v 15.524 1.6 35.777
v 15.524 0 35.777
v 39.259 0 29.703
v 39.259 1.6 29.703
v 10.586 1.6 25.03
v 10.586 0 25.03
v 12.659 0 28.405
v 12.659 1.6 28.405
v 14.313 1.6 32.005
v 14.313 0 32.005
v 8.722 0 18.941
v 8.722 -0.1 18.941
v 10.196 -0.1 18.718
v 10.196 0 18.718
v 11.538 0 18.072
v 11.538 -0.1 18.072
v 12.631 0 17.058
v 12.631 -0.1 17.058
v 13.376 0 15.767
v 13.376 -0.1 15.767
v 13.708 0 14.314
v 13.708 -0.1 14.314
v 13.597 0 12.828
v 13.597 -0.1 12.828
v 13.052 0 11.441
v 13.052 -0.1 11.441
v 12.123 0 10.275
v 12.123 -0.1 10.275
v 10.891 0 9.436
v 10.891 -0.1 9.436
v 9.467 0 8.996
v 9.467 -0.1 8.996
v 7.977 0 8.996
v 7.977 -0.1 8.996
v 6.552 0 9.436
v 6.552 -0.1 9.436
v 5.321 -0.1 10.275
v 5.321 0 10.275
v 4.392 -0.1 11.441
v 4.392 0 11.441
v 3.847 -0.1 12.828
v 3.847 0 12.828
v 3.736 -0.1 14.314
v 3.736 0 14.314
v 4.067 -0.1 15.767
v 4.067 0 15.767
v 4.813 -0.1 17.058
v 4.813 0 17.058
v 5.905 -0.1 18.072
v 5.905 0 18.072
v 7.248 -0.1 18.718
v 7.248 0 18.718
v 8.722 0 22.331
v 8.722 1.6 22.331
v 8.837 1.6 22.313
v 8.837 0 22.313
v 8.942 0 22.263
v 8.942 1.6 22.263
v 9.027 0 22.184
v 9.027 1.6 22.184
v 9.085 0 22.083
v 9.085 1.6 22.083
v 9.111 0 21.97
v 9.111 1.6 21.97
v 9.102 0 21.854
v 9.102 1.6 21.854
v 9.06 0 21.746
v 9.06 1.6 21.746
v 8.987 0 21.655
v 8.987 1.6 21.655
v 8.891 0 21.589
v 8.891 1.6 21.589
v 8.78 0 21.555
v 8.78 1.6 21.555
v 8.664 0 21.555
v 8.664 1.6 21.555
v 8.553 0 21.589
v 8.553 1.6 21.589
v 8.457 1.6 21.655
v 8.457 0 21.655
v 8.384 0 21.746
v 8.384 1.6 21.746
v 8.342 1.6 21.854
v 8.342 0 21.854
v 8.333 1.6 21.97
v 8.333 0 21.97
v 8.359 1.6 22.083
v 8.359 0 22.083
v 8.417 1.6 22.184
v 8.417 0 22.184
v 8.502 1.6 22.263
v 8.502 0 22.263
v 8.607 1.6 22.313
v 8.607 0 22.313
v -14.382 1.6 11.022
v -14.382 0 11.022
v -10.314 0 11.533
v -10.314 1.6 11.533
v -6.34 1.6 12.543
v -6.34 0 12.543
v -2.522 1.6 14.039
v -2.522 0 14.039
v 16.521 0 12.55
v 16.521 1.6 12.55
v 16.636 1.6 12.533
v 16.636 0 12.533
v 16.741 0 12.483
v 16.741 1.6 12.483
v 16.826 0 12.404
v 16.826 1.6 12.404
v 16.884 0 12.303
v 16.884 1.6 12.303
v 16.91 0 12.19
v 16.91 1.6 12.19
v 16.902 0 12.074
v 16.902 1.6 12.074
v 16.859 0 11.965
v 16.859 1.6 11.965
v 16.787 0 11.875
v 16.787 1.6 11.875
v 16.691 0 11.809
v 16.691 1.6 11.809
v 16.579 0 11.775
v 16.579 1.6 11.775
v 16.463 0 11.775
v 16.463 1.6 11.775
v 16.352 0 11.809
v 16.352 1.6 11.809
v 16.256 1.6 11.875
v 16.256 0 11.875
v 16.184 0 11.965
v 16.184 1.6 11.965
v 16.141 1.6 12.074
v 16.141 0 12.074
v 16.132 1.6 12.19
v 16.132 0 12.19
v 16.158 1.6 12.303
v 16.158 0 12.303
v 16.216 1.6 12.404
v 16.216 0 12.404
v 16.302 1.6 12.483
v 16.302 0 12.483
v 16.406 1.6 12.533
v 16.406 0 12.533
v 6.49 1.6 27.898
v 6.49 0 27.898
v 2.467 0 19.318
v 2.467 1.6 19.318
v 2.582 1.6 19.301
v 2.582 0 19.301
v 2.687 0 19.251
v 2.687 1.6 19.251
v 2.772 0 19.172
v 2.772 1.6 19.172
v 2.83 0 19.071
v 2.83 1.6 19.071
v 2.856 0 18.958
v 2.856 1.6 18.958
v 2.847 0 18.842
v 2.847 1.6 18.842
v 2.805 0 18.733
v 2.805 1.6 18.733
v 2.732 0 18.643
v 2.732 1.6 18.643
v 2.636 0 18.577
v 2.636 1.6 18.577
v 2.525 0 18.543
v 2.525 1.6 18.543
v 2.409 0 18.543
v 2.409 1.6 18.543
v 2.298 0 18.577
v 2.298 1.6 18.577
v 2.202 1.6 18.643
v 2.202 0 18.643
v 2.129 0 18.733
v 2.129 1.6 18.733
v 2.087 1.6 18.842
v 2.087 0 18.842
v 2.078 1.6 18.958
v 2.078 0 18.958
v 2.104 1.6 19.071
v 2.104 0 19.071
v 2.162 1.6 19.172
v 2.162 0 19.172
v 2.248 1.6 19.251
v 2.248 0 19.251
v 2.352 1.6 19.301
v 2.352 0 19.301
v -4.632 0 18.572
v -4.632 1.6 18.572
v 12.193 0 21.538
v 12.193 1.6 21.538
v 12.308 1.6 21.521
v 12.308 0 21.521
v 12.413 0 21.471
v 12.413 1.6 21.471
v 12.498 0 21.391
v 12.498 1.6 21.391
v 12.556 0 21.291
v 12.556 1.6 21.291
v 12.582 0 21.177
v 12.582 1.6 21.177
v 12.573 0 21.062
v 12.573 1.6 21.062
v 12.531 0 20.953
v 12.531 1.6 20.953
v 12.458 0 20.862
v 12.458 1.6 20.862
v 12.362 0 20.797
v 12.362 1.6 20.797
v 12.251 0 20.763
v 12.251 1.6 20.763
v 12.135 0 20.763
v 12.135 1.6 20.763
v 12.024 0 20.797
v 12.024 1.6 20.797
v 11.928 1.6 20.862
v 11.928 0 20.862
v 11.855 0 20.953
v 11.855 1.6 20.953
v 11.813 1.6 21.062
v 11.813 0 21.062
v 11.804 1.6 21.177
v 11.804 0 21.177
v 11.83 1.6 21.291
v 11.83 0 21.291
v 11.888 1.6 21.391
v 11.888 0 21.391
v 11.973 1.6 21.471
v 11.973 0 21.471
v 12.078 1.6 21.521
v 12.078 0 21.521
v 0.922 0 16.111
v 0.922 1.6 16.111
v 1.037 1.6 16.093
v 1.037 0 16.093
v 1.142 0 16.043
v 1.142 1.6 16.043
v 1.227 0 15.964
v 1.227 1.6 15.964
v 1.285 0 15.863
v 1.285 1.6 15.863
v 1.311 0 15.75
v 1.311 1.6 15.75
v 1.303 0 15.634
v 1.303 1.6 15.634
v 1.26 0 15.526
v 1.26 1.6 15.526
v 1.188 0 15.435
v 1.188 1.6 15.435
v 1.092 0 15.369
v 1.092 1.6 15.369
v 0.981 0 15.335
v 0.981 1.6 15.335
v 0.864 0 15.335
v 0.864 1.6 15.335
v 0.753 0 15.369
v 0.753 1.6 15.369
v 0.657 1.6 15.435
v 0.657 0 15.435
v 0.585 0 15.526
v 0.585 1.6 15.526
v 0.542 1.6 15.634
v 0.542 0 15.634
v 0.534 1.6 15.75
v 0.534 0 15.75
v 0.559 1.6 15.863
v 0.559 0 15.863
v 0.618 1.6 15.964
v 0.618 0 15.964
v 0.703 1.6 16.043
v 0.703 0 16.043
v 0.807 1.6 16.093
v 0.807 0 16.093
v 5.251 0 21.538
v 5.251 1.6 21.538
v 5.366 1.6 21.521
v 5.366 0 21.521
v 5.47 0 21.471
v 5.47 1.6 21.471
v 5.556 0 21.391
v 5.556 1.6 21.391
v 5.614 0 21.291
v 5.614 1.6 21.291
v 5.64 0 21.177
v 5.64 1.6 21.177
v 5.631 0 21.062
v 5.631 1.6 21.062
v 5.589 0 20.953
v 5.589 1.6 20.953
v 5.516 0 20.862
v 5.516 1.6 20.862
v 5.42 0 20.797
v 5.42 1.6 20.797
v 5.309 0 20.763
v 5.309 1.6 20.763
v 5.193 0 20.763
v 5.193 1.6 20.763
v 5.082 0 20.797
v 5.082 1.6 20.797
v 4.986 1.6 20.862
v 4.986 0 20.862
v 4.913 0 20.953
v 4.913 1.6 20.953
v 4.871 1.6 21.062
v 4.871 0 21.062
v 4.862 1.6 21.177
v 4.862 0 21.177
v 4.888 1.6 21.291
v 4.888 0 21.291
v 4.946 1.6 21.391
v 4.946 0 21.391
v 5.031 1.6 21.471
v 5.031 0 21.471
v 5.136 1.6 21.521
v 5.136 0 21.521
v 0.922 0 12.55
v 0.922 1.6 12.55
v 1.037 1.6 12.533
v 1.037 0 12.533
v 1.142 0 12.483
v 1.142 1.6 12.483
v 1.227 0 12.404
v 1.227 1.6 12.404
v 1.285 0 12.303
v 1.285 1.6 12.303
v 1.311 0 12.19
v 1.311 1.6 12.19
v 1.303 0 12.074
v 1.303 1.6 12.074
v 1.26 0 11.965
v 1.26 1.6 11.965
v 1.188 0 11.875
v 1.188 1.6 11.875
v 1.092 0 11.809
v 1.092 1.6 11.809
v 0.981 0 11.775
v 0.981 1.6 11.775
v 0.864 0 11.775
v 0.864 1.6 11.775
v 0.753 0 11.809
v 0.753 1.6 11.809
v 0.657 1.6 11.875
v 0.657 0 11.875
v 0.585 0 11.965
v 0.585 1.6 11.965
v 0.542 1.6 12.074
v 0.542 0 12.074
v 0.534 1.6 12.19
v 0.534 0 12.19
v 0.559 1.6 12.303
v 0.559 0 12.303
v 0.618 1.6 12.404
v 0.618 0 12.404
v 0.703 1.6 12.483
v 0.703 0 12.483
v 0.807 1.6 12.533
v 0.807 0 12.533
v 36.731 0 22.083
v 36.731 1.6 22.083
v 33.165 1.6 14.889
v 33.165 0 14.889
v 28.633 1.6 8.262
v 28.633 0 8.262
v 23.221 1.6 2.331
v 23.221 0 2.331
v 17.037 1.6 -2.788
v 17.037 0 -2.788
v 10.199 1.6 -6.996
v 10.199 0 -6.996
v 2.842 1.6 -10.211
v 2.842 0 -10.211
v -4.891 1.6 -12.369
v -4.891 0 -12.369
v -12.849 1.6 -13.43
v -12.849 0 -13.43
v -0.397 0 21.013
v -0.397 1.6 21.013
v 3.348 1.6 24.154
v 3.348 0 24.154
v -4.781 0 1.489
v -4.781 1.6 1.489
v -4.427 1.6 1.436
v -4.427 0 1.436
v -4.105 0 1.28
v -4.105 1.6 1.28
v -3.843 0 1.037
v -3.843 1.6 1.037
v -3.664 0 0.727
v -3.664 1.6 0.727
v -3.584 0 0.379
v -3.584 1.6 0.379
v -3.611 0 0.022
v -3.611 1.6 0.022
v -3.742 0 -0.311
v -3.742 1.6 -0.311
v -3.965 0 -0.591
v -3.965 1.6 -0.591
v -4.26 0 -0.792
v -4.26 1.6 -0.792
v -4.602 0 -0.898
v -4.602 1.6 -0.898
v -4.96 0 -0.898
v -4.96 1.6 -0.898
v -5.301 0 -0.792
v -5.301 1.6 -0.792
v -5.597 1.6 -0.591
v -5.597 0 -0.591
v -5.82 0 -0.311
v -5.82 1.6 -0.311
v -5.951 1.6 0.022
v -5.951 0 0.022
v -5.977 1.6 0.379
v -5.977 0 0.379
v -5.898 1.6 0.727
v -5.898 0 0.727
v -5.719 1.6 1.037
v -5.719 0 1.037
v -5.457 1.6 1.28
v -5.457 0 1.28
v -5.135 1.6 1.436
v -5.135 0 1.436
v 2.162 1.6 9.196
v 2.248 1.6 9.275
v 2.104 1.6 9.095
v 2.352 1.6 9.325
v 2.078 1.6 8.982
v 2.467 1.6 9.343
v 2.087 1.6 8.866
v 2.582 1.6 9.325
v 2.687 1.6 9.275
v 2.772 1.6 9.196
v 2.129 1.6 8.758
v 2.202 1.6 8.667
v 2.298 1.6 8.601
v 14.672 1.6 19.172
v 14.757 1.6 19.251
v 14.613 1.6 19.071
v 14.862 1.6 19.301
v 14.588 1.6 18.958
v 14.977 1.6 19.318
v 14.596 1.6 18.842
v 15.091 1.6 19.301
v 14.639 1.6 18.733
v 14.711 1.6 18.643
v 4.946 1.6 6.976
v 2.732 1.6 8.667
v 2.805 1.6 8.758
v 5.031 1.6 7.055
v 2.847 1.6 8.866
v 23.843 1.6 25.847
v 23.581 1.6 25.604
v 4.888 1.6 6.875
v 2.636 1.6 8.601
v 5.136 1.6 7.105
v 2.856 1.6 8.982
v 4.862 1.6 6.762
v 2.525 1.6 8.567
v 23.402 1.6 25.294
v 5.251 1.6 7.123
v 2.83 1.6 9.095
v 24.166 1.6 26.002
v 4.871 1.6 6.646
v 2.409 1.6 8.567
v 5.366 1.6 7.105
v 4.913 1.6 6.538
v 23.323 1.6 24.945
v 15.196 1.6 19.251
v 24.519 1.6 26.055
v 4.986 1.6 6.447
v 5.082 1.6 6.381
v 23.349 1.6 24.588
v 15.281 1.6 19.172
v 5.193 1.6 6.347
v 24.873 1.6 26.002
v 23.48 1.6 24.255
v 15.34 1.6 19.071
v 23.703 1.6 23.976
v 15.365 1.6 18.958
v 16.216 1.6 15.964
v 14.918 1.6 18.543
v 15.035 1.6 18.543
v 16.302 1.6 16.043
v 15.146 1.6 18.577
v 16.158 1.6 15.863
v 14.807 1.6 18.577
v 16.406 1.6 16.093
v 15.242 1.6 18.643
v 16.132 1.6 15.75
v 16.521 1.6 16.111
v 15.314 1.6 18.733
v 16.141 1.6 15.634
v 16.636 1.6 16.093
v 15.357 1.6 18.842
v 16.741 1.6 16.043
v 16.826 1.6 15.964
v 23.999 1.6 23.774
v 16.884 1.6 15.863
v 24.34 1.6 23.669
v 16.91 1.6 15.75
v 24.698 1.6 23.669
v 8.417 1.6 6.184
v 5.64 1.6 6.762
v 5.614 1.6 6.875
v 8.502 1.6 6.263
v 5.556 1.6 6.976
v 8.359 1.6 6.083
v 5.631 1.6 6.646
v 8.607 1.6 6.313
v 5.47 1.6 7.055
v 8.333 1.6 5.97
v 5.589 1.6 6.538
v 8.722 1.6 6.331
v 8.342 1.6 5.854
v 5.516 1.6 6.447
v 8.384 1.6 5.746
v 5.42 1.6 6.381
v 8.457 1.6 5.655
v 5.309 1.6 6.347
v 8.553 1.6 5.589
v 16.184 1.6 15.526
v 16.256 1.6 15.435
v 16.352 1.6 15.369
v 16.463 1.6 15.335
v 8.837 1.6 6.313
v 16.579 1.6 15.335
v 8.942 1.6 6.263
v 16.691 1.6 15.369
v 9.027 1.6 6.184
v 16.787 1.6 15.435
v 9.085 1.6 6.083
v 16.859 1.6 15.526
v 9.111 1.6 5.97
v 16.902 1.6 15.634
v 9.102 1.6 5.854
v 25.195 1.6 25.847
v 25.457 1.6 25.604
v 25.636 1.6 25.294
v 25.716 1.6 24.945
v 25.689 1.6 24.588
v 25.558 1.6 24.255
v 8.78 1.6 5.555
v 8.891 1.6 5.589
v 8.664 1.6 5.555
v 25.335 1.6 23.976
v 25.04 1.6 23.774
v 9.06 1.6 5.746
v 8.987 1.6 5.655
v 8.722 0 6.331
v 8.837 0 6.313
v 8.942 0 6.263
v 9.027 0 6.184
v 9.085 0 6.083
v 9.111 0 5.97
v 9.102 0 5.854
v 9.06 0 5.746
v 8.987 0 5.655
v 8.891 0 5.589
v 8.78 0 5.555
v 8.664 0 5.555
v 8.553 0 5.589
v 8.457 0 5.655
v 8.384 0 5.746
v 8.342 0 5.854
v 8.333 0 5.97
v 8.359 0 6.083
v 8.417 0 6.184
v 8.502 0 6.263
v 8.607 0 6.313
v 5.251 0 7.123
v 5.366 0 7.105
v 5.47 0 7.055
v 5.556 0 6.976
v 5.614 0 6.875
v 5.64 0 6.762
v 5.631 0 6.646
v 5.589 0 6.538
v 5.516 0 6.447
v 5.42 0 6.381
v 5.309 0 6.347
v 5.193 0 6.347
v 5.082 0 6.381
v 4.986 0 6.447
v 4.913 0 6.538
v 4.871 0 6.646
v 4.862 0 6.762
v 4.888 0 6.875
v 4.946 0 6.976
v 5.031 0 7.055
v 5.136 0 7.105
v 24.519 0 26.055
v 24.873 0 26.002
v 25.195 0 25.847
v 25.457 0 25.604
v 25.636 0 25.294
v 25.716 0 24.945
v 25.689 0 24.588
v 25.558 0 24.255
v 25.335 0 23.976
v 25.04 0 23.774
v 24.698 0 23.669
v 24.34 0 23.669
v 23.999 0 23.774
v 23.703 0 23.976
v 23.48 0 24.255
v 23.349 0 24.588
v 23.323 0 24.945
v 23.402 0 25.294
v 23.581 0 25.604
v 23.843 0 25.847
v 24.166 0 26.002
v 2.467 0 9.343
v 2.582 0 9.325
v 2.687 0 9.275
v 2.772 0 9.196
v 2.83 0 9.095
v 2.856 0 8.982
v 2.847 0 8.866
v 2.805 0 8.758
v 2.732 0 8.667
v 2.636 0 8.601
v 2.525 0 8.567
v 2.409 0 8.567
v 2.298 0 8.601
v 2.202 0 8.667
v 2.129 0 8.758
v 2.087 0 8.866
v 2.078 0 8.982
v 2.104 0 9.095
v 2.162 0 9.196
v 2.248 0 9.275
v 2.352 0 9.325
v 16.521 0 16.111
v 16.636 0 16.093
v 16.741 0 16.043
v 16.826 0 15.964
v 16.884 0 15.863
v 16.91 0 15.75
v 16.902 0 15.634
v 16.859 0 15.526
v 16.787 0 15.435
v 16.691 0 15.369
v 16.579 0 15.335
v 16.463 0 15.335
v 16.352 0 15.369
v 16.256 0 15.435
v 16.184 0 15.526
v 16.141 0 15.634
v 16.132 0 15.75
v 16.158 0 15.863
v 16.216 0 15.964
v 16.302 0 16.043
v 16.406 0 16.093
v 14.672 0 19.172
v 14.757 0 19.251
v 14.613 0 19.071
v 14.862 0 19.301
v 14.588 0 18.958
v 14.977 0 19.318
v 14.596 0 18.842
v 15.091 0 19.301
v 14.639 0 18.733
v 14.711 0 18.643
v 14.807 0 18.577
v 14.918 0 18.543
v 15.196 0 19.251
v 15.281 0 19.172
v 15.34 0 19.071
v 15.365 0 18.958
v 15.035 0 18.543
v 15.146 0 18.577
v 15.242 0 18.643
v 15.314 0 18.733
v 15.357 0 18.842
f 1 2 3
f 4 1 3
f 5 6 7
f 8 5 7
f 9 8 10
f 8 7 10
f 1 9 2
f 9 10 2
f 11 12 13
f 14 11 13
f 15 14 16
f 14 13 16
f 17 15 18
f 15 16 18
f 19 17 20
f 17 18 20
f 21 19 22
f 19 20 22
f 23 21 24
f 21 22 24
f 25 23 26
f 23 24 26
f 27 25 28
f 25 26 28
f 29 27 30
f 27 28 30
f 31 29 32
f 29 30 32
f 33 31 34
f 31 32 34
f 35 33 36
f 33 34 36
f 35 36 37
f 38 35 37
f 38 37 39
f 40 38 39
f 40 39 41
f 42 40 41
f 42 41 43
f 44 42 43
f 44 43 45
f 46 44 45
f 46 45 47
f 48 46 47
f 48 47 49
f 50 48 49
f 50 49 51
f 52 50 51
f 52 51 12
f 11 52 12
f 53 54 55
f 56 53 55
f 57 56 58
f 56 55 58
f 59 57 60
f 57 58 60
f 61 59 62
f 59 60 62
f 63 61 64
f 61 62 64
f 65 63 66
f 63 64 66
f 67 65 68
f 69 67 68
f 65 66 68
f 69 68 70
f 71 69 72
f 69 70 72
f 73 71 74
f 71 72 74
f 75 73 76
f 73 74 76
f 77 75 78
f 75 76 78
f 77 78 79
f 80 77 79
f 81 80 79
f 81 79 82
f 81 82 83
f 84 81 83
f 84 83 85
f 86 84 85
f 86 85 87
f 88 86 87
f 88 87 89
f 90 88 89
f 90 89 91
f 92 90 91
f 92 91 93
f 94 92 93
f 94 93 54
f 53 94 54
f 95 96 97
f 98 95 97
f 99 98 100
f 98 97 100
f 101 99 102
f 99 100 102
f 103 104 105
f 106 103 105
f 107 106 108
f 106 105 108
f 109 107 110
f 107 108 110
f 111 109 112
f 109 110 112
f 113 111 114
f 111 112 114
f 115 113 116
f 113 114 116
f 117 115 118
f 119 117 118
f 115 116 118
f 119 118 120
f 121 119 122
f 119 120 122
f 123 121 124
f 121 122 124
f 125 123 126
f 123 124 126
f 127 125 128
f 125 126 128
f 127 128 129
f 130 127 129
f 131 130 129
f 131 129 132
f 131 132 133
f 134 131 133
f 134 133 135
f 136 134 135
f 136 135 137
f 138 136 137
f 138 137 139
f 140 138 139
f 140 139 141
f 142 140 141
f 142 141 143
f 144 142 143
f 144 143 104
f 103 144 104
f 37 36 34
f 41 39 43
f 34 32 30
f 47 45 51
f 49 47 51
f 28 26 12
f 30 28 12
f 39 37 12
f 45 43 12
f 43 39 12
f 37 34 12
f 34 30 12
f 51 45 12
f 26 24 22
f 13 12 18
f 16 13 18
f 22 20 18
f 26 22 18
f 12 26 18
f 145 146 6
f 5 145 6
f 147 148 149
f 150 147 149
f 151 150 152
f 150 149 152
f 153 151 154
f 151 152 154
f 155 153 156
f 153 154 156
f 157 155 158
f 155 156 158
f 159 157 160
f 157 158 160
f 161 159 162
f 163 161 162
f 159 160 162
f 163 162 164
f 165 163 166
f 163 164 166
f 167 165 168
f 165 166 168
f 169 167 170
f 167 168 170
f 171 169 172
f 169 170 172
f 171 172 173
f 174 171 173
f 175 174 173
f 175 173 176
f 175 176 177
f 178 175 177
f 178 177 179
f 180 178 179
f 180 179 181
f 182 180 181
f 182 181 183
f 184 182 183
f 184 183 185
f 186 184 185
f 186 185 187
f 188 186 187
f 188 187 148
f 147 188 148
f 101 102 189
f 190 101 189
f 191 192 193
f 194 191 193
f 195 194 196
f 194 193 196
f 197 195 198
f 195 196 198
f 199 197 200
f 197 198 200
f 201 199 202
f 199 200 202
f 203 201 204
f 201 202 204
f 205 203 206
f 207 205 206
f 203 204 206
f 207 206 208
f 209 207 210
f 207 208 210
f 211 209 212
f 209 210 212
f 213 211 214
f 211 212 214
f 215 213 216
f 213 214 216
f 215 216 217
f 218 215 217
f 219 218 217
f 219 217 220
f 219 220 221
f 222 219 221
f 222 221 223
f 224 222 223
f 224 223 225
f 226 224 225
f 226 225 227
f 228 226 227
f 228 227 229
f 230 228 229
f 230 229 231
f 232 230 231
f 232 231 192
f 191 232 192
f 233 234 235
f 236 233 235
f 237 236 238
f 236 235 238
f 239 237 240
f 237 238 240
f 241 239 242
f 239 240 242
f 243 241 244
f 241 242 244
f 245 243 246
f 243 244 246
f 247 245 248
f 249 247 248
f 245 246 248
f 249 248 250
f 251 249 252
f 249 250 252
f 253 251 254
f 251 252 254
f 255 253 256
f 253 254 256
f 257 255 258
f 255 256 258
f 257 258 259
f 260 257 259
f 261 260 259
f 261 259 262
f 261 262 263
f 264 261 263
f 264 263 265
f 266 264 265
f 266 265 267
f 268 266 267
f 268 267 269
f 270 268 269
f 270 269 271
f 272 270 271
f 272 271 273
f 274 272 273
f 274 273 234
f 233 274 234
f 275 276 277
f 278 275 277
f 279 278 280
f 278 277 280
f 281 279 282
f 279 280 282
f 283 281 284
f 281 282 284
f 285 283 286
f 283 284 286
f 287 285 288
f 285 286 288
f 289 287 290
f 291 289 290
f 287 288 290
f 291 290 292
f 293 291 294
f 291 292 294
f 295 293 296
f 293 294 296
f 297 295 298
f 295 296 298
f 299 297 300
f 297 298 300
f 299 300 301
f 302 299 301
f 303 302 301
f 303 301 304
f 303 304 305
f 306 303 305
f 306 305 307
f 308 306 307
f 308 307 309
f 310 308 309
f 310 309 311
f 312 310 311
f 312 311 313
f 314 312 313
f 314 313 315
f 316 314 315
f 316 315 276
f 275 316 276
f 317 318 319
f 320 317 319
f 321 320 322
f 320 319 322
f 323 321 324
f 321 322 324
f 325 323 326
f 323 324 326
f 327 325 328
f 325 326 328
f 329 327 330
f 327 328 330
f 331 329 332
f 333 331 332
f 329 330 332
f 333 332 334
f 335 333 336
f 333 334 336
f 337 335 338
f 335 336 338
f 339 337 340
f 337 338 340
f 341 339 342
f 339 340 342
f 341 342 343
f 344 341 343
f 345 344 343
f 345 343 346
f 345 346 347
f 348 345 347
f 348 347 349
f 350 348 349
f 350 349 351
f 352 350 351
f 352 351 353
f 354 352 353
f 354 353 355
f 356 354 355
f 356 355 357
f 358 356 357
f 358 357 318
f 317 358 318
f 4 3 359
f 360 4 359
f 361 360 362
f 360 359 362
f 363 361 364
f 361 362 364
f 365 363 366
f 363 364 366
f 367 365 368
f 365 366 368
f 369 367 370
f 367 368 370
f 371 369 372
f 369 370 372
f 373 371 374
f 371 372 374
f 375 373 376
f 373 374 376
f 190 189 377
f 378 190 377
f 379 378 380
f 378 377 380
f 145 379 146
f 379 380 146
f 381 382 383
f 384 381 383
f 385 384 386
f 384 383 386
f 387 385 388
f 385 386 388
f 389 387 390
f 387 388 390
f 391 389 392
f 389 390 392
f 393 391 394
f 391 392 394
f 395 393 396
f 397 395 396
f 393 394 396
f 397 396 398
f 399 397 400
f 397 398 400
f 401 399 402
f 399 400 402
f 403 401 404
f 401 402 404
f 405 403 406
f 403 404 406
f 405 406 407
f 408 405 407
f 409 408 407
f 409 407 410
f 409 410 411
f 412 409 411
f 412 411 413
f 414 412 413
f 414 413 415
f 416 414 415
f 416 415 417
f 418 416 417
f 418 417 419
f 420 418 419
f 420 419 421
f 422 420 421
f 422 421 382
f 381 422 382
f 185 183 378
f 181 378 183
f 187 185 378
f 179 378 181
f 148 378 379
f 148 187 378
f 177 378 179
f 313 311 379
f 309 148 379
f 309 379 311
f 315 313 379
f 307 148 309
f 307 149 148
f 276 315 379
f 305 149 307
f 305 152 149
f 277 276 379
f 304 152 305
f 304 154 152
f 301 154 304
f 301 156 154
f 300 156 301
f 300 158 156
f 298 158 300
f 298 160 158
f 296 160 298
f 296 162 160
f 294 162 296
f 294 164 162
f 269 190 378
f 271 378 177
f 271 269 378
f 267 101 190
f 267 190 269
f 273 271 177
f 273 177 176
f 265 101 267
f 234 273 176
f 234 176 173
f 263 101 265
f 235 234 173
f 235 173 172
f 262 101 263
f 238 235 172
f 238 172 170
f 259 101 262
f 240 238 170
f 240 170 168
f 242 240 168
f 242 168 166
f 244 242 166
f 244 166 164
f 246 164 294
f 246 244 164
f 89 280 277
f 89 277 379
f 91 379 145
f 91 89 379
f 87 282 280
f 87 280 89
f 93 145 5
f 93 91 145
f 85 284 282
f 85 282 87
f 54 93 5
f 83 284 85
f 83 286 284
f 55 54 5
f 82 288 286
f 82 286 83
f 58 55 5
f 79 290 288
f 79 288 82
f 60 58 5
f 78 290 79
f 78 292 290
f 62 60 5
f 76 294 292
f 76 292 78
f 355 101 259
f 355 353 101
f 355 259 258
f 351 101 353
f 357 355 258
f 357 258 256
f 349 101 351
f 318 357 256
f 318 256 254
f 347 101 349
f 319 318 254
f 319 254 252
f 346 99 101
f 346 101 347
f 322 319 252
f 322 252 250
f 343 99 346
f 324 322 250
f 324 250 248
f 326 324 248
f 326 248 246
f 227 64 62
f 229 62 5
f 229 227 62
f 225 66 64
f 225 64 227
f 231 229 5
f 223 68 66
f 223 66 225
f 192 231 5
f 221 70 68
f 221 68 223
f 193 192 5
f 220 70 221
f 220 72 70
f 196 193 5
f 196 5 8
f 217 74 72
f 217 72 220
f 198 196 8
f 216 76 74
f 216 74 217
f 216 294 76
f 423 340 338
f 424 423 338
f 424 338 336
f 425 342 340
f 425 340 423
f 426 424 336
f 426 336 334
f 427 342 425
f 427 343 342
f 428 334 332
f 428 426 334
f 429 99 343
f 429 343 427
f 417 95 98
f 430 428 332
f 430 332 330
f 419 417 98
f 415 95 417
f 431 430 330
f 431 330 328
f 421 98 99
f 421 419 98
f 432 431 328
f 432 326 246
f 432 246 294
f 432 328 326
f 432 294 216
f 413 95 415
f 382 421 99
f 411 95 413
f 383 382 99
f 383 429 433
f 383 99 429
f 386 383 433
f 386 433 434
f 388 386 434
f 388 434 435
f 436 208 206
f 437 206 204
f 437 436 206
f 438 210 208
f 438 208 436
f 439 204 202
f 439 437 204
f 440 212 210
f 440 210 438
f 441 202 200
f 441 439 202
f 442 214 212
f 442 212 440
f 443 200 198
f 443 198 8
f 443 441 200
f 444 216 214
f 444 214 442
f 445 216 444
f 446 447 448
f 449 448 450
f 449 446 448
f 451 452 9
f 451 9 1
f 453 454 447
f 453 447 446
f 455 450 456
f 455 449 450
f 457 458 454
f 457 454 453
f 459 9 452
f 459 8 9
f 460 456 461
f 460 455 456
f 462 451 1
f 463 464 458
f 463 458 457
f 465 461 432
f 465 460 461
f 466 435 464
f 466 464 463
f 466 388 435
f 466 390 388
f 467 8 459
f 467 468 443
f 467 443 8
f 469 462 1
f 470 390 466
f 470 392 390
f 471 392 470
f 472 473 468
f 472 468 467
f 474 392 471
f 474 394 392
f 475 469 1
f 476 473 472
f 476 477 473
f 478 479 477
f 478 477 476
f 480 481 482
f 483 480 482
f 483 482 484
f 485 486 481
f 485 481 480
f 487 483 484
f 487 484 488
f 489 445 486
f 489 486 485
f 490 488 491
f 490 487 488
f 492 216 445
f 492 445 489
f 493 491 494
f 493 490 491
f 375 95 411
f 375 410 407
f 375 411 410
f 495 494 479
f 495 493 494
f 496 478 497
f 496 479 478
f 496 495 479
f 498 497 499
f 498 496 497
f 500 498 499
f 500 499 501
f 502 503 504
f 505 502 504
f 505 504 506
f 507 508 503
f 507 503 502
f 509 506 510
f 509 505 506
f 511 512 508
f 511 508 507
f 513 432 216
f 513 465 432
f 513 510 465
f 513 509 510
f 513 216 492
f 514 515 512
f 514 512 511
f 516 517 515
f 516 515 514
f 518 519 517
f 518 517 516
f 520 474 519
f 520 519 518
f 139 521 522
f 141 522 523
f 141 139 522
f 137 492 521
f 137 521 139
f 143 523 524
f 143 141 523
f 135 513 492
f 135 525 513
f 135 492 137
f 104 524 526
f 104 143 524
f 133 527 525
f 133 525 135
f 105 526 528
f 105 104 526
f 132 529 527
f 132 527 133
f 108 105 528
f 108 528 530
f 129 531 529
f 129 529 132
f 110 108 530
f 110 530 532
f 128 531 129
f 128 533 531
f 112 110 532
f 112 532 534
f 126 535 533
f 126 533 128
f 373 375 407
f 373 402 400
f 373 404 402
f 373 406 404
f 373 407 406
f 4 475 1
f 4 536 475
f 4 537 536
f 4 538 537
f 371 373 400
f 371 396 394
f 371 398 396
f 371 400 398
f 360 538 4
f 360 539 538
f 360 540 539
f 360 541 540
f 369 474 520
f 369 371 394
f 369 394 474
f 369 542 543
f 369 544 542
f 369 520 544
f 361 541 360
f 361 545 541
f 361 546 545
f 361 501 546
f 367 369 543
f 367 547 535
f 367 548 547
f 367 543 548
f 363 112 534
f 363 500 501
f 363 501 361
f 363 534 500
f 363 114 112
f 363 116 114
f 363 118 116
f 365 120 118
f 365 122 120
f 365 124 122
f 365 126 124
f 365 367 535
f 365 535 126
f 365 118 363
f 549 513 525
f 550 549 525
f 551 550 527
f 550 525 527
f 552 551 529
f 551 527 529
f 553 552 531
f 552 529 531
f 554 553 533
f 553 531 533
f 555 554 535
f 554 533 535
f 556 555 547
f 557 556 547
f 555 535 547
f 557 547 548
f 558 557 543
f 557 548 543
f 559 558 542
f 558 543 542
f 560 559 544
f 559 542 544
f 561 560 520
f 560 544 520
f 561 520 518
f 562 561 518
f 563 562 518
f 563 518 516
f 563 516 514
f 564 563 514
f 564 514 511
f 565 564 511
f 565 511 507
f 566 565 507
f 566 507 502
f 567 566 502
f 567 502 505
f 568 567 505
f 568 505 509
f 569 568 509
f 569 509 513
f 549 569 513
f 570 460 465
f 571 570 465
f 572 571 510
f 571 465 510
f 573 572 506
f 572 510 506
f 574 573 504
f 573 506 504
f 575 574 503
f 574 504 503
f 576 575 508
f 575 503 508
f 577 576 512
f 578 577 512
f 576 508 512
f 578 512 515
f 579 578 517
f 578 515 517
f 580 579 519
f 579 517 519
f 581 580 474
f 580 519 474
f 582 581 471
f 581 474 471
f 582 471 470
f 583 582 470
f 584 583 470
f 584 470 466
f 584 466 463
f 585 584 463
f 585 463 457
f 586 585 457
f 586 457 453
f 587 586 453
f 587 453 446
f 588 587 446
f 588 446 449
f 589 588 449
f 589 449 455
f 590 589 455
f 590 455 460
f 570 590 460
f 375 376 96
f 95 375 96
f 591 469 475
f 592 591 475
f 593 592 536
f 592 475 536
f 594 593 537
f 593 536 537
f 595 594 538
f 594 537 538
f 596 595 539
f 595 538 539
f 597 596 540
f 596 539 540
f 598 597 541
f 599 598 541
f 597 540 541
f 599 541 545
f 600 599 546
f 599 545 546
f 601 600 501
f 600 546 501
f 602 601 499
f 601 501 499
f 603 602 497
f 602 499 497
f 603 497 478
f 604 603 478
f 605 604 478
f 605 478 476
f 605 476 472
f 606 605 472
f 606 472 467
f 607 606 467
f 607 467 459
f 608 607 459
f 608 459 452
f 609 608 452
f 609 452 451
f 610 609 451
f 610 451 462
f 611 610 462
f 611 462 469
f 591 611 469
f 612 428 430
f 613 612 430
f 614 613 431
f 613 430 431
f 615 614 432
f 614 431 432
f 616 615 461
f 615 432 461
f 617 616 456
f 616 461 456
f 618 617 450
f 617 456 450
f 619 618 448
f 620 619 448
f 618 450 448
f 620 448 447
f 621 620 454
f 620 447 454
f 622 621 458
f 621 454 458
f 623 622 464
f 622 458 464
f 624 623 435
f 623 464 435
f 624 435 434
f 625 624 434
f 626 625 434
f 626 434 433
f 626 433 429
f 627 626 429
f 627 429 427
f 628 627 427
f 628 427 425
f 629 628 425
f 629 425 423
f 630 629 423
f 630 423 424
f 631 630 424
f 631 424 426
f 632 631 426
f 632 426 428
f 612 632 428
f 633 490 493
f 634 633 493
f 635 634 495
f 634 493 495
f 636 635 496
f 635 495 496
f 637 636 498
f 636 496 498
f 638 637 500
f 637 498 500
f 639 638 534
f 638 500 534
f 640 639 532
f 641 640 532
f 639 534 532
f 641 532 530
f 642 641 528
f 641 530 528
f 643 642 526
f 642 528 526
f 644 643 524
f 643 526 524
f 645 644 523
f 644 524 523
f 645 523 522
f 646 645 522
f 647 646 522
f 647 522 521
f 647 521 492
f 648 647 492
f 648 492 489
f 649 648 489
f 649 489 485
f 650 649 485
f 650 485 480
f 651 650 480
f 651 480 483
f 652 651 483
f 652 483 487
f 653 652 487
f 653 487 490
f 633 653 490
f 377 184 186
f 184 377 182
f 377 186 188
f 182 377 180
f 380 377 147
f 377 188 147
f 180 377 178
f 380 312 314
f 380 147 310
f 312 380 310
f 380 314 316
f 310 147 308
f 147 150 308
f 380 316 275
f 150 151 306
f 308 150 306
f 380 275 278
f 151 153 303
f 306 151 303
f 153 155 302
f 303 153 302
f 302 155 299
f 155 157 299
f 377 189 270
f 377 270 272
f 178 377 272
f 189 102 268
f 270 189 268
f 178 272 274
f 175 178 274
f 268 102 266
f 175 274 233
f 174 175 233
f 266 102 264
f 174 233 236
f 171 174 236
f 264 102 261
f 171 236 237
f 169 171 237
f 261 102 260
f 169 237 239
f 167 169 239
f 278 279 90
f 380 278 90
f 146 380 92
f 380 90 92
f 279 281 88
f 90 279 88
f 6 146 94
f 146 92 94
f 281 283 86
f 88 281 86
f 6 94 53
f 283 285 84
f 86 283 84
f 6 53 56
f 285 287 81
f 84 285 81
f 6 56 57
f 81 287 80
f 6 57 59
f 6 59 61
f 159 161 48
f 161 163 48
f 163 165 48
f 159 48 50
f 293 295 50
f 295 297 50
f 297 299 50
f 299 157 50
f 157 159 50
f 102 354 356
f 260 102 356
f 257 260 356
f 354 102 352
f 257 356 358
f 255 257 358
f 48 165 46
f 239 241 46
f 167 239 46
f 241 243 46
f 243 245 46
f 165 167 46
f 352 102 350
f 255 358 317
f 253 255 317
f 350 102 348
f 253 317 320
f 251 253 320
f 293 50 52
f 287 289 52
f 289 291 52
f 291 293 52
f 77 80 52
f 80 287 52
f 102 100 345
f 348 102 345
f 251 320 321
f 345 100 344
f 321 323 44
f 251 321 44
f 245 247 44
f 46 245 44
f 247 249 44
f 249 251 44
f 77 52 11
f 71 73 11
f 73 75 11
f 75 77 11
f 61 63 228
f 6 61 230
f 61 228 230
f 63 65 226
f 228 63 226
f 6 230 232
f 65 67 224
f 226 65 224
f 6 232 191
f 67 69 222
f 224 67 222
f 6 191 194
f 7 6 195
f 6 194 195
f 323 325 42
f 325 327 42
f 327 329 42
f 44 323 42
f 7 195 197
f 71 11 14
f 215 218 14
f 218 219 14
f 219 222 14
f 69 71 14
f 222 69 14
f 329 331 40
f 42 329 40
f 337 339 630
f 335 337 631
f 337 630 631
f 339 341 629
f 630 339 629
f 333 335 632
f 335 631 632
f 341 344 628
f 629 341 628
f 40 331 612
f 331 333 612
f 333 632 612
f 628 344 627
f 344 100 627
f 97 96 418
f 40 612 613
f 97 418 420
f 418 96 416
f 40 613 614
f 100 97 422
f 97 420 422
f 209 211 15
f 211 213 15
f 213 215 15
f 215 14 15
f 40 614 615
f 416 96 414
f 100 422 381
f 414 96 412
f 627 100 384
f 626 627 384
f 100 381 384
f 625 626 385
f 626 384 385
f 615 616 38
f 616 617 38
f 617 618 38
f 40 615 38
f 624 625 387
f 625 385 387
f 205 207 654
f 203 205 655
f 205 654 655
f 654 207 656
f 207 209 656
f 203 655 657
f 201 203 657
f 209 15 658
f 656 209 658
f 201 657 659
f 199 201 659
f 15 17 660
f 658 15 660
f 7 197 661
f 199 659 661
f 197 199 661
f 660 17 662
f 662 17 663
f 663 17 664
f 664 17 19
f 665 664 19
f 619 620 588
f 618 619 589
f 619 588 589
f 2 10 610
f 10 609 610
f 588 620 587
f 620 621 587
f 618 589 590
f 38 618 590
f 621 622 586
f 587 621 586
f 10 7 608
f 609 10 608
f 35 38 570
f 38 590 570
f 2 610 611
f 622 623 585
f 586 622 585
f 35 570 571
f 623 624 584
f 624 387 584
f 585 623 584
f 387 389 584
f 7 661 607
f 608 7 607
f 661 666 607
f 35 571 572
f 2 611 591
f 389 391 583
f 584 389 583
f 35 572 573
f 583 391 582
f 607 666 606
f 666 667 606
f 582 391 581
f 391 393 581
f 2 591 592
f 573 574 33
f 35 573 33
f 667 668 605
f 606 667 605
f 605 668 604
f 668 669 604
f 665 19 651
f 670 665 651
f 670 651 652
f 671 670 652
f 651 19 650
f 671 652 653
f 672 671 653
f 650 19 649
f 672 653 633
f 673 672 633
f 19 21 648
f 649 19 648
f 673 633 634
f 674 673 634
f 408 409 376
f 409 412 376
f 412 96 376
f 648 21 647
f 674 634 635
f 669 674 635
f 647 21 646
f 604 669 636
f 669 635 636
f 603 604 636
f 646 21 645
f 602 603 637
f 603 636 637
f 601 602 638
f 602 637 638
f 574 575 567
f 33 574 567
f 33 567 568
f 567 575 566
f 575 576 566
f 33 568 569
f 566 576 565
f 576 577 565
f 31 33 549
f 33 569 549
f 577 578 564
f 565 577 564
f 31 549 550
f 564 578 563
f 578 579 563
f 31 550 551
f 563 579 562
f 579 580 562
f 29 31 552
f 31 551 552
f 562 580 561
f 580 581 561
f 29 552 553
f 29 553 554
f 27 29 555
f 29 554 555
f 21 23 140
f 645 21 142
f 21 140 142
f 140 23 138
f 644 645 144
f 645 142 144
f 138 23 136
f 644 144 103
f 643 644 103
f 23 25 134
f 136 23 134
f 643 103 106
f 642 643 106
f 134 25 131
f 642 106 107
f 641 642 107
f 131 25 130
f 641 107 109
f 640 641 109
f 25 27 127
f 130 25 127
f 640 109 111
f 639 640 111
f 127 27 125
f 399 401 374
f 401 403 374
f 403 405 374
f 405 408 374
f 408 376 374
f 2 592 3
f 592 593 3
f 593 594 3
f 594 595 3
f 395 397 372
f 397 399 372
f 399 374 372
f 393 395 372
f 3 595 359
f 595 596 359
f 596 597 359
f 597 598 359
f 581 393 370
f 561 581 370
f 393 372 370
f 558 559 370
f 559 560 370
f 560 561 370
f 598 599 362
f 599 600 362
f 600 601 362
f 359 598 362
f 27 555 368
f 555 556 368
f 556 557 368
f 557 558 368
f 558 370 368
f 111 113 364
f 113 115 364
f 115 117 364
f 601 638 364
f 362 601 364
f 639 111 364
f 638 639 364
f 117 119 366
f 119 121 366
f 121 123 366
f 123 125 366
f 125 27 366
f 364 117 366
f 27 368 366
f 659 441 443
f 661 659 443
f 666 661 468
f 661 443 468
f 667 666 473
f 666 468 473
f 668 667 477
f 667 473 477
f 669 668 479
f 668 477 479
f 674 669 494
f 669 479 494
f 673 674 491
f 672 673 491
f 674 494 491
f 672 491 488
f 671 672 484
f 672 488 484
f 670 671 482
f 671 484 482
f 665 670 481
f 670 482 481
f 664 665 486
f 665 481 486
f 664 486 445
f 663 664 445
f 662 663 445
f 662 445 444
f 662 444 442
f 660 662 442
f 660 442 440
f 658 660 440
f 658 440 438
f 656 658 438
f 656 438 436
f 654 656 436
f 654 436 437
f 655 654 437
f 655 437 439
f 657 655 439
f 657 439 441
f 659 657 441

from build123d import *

# Parameters (mm, degrees)
SKETCH2_R           = 5
BOSS_EXTRUDE1_DEPTH = 1.6
SKETCH3_R           = 1.2
CUT_EXTRUDE1_DEPTH  = 1.7
SKETCH10_R          = 0.39
CUT_EXTRUDE6_DEPTH  = 10
BOSS_EXTRUDE3_START = -1.7
SKETCH11_R          = 5
BOSS_EXTRUDE3_DEPTH = 1.7


with BuildPart() as part:
    # Sketch2 → Boss-Extrude1 (new body)
    with BuildSketch(Plane(origin=(0, 0, 0), x_dir=(1, 0, 0), z_dir=(0, 1, 0))):
        with BuildLine():
            Line((-12.84928634, 13.429675326), (-14.381752422, -11.022350105))
            ThreePointArc((-14.381752422, -11.022350105), (-8.311058851, -11.976103518), (-2.52245469, -14.038875409))
            Line((-2.52245469, -14.038875409), (-4.632066163, -18.572035393))
            ThreePointArc((-4.632066163, -18.572035393), (1.543927211, -22.501579223), (6.490366829, -27.897591081))
            Line((6.490366829, -27.897591081), (10.586127051, -25.029708899))
            ThreePointArc((10.586127051, -25.029708899), (13.540412509, -30.180153963), (15.523932384, -35.776629267))
            Line((15.523932384, -35.776629267), (39.259103853, -29.702780788))
            ThreePointArc((39.259103853, -29.702780788), (20.218425809, 0.336488596), (-12.84928634, 13.429675326))
        make_face()
        with Locations(Location((8.721864443, -13.940574544, 0), (0, 0, 270))):
            Circle(SKETCH2_R, mode=Mode.SUBTRACT)
    extrude(amount=BOSS_EXTRUDE1_DEPTH)

    # Sketch3 → Cut-Extrude1 (cut)
    with BuildSketch(Plane(origin=(0, 1.6, 0), x_dir=(1, 0, 0), z_dir=(0, 1, 0))):
        with Locations(Location((-4.780794064, -0.288914882, 0), (0, 0, 270))):
            Circle(SKETCH3_R)
        with Locations(Location((24.519221563, -24.855385868, 0), (0, 0, 270))):
            Circle(SKETCH3_R)
    extrude(amount=-CUT_EXTRUDE1_DEPTH, mode=Mode.SUBTRACT)

    # Sketch10 → Cut-Extrude6 (cut)
    with BuildSketch(Plane(origin=(0, 1.6, 0), x_dir=(1, 0, 0), z_dir=(0, 1, 0))):
        with Locations(Location((5.25079453, -6.732823601, 0), (0, 0, 270))):
            Circle(SKETCH10_R)
        with Locations(Location((8.721864443, -5.940574544, 0), (0, 0, 270))):
            Circle(SKETCH10_R)
        with Locations(Location((2.467212583, -8.952656129, 0), (0, 0, 270))):
            Circle(SKETCH10_R)
        with Locations(Location((0.922441145, -12.160407072, 0), (0, 0, 270))):
            Circle(SKETCH10_R)
        with Locations(Location((0.922441145, -15.720742016, 0), (0, 0, 270))):
            Circle(SKETCH10_R)
        with Locations(Location((2.467212583, -18.928492959, 0), (0, 0, 270))):
            Circle(SKETCH10_R)
        with Locations(Location((5.25079453, -21.148325487, 0), (0, 0, 270))):
            Circle(SKETCH10_R)
        with Locations(Location((8.721864443, -21.940574544, 0), (0, 0, 270))):
            Circle(SKETCH10_R)
        with Locations(Location((12.192934355, -21.148325487, 0), (0, 0, 270))):
            Circle(SKETCH10_R)
        with Locations(Location((14.976516302, -18.928492959, 0), (0, 0, 270))):
            Circle(SKETCH10_R)
        with Locations(Location((16.52128774, -15.720742016, 0), (0, 0, 270))):
            Circle(SKETCH10_R)
        with Locations(Location((16.52128774, -12.160407072, 0), (0, 0, 270))):
            Circle(SKETCH10_R)
    extrude(amount=-CUT_EXTRUDE6_DEPTH, mode=Mode.SUBTRACT)

    # Sketch11 → Boss-Extrude3 (add)
    with BuildSketch(Plane(origin=(0, 1.6, 0), x_dir=(1, 0, 0), z_dir=(0, 1, 0)).offset(BOSS_EXTRUDE3_START)):
        with Locations(Location((8.721864443, -13.940574544, 0), (0, 0, 270))):
            Circle(SKETCH11_R)
    extrude(amount=BOSS_EXTRUDE3_DEPTH)


solid = part.part
